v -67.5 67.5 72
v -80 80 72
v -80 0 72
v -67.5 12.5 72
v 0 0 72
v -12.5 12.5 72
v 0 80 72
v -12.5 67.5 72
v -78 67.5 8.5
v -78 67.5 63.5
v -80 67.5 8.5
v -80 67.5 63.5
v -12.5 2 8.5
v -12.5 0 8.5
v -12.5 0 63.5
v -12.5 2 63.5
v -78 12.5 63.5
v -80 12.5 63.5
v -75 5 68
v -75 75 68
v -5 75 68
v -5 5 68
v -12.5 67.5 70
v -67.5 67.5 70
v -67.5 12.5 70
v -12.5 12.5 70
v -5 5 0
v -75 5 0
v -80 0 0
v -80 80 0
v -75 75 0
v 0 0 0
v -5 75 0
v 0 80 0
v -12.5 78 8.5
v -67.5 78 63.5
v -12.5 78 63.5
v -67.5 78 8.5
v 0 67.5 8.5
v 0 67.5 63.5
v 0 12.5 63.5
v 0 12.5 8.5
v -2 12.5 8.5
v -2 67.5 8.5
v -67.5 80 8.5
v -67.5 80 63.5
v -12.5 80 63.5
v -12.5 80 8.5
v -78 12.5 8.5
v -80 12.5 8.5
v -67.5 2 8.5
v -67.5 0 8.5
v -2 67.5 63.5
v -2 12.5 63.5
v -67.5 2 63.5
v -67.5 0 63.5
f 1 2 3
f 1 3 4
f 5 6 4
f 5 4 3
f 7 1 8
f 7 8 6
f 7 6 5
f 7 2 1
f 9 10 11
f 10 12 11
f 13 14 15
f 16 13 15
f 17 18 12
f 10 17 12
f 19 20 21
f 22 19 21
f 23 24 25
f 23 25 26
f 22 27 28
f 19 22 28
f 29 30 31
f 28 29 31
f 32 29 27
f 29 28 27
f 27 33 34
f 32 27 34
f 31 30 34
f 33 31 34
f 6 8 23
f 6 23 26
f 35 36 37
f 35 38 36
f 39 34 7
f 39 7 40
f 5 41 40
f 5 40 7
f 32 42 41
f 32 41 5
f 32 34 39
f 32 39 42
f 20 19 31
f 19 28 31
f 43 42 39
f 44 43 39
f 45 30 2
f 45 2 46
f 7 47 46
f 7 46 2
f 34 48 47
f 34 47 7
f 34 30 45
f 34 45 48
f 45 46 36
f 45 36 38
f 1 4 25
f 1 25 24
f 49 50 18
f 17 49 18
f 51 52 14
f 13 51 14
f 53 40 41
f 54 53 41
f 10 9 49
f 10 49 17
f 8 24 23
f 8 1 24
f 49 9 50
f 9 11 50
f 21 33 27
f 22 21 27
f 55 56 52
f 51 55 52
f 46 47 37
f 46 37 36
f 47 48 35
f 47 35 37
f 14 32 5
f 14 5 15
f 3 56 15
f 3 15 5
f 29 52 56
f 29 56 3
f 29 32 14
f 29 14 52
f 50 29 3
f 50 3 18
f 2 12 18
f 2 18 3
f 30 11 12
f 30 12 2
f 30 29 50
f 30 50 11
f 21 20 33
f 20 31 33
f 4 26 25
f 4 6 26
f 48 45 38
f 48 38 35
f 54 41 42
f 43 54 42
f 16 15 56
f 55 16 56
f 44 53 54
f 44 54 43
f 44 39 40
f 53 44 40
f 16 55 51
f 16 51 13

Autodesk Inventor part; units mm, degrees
ref_plane "YZ Plane" through (0, 0, 0) normal (1, 0, 0) x (0, 1, 0)
ref_plane "XZ Plane" through (0, 0, 0) normal (0, 1, 0) x (-1, 0, 0)
ref_plane "XY Plane" through (0, 0, 0) normal (0, 0, 1) x (1, 0, 0)
sketch "Sketch3" plane through (0, 0, 0) normal (0, 0, 1) x (1, 0, 0)
  line L0 (0, 0) -> (-80, 0)
  line L1 (-80, 0) -> (-80, 80)
  line L2 (-80, 80) -> (0, 80)
  line L3 (0, 80) -> (0, 0)
  line L4 (-75, 75) -> (-5, 75)
  line L5 (-5, 75) -> (-5, 5)
  line L6 (-5, 5) -> (-75, 5)
  line L7 (-75, 5) -> (-75, 75)
  dimension "d129" = 80
  dimension "d130" = 80
  dimension "d131" = 70
  dimension "d132" = 70
extrude "Extrusion19" add sketch "Sketch3" along normal blind 68
sketch "Sketch18" plane through (0, 0, 68) normal (0, 0, 1) x (1, 0, 0)
  line L0 (0, 80) -> (-80, 80) projected
  line L1 (0, 0) -> (-80, 0)
  line L2 (-80, 0) -> (-80, 80)
  line L3 (-80, 80) -> (0, 80)
  line L4 (0, 80) -> (0, 0)
  dimension "d135" = 80
  dimension "d136" = 80
extrude "Extrusion20" add sketch "Sketch18" along normal blind 4
sketch "Sketch20" plane through (0, 0, 72) normal (0, 0, 1) x (1, 0, 0)
  line L0 (-67.5, 67.5) -> (-12.5, 67.5)
  line L1 (-12.5, 67.5) -> (-12.5, 12.5)
  line L2 (-12.5, 12.5) -> (-67.5, 12.5)
  line L3 (-67.5, 12.5) -> (-67.5, 67.5)
  point P0 (0, 0)
  dimension "d139" = 55
  dimension "d140" = 55
extrude "Extrusion21" cut sketch "Sketch20" against normal blind 2
sketch "Sketch21" plane through (0, 0, 0) normal (1, 0, 0) x (0, 0, -1)
  line L0 (-63.5, 12.5) -> (-8.5, 12.5)
  line L1 (-8.5, 12.5) -> (-8.5, 67.5)
  line L2 (-8.5, 67.5) -> (-63.5, 67.5)
  line L3 (-63.5, 67.5) -> (-63.5, 12.5)
  point P0 (0, 0)
  dimension "d143" = 55
  dimension "d144" = 55
sketch "Sketch22" plane through (-80, 0, 0) normal (-1, 0, 0) x (0, 0, 1)
  line L0 (8.5, 12.5) -> (63.5, 12.5)
  line L1 (63.5, 12.5) -> (63.5, 67.5)
  line L2 (63.5, 67.5) -> (8.5, 67.5)
  line L3 (8.5, 67.5) -> (8.5, 12.5)
  point P0 (0, 0)
  dimension "d145" = 55
  dimension "d146" = 55
sketch "Sketch23" plane through (-80, 0, 0) normal (0, -1, 0) x (1, 0, 0)
  line L0 (12.5, 8.5) -> (67.5, 8.5)
  line L1 (67.5, 8.5) -> (67.5, 63.5)
  line L2 (67.5, 63.5) -> (12.5, 63.5)
  line L3 (12.5, 63.5) -> (12.5, 8.5)
  point P0 (80, 0)
  dimension "d147" = 55
  dimension "d148" = 55
sketch "Sketch24" plane through (-80, 80, 0) normal (0, 1, 0) x (1, 0, 0)
  line L0 (12.5, -8.5) -> (67.5, -8.5)
  line L1 (67.5, -8.5) -> (67.5, -63.5)
  line L2 (67.5, -63.5) -> (12.5, -63.5)
  line L3 (12.5, -63.5) -> (12.5, -8.5)
  point P0 (80, 0)
  dimension "d149" = 55
  dimension "d150" = 55
extrude "Extrusion22" cut sketch "Sketch21" against normal blind 2
extrude "Extrusion23" cut sketch "Sketch24" against normal blind 2
extrude "Extrusion24" cut sketch "Sketch23" against normal blind 2
extrude "Extrusion25" cut sketch "Sketch22" against normal blind 2
sketch "Sketch25" plane through (-80, 0, 0) normal (0, -1, 0) x (1, 0, 0)
  line L0 (80, 0) -> (0, 0) projected
  line L1 (0, 0) -> (10.6, 0)
  line L2 (10.6, 0) -> (10.6, 5.6)
  line L3 (10.6, 5.6) -> (0, 5.6)
  line L4 (0, 5.6) -> (0, 0)
  line L5 (80, 0) -> (69.4, 0)
  line L6 (69.4, 0) -> (69.4, 5.6)
  line L7 (69.4, 5.6) -> (80, 5.6)
  line L8 (80, 5.6) -> (80, 0)
  dimension "d159" = 10.6
  dimension "d160" = 5.6
  dimension "d161" = 10.6
  dimension "d162" = 5.6
properties part number "End-Effector"
